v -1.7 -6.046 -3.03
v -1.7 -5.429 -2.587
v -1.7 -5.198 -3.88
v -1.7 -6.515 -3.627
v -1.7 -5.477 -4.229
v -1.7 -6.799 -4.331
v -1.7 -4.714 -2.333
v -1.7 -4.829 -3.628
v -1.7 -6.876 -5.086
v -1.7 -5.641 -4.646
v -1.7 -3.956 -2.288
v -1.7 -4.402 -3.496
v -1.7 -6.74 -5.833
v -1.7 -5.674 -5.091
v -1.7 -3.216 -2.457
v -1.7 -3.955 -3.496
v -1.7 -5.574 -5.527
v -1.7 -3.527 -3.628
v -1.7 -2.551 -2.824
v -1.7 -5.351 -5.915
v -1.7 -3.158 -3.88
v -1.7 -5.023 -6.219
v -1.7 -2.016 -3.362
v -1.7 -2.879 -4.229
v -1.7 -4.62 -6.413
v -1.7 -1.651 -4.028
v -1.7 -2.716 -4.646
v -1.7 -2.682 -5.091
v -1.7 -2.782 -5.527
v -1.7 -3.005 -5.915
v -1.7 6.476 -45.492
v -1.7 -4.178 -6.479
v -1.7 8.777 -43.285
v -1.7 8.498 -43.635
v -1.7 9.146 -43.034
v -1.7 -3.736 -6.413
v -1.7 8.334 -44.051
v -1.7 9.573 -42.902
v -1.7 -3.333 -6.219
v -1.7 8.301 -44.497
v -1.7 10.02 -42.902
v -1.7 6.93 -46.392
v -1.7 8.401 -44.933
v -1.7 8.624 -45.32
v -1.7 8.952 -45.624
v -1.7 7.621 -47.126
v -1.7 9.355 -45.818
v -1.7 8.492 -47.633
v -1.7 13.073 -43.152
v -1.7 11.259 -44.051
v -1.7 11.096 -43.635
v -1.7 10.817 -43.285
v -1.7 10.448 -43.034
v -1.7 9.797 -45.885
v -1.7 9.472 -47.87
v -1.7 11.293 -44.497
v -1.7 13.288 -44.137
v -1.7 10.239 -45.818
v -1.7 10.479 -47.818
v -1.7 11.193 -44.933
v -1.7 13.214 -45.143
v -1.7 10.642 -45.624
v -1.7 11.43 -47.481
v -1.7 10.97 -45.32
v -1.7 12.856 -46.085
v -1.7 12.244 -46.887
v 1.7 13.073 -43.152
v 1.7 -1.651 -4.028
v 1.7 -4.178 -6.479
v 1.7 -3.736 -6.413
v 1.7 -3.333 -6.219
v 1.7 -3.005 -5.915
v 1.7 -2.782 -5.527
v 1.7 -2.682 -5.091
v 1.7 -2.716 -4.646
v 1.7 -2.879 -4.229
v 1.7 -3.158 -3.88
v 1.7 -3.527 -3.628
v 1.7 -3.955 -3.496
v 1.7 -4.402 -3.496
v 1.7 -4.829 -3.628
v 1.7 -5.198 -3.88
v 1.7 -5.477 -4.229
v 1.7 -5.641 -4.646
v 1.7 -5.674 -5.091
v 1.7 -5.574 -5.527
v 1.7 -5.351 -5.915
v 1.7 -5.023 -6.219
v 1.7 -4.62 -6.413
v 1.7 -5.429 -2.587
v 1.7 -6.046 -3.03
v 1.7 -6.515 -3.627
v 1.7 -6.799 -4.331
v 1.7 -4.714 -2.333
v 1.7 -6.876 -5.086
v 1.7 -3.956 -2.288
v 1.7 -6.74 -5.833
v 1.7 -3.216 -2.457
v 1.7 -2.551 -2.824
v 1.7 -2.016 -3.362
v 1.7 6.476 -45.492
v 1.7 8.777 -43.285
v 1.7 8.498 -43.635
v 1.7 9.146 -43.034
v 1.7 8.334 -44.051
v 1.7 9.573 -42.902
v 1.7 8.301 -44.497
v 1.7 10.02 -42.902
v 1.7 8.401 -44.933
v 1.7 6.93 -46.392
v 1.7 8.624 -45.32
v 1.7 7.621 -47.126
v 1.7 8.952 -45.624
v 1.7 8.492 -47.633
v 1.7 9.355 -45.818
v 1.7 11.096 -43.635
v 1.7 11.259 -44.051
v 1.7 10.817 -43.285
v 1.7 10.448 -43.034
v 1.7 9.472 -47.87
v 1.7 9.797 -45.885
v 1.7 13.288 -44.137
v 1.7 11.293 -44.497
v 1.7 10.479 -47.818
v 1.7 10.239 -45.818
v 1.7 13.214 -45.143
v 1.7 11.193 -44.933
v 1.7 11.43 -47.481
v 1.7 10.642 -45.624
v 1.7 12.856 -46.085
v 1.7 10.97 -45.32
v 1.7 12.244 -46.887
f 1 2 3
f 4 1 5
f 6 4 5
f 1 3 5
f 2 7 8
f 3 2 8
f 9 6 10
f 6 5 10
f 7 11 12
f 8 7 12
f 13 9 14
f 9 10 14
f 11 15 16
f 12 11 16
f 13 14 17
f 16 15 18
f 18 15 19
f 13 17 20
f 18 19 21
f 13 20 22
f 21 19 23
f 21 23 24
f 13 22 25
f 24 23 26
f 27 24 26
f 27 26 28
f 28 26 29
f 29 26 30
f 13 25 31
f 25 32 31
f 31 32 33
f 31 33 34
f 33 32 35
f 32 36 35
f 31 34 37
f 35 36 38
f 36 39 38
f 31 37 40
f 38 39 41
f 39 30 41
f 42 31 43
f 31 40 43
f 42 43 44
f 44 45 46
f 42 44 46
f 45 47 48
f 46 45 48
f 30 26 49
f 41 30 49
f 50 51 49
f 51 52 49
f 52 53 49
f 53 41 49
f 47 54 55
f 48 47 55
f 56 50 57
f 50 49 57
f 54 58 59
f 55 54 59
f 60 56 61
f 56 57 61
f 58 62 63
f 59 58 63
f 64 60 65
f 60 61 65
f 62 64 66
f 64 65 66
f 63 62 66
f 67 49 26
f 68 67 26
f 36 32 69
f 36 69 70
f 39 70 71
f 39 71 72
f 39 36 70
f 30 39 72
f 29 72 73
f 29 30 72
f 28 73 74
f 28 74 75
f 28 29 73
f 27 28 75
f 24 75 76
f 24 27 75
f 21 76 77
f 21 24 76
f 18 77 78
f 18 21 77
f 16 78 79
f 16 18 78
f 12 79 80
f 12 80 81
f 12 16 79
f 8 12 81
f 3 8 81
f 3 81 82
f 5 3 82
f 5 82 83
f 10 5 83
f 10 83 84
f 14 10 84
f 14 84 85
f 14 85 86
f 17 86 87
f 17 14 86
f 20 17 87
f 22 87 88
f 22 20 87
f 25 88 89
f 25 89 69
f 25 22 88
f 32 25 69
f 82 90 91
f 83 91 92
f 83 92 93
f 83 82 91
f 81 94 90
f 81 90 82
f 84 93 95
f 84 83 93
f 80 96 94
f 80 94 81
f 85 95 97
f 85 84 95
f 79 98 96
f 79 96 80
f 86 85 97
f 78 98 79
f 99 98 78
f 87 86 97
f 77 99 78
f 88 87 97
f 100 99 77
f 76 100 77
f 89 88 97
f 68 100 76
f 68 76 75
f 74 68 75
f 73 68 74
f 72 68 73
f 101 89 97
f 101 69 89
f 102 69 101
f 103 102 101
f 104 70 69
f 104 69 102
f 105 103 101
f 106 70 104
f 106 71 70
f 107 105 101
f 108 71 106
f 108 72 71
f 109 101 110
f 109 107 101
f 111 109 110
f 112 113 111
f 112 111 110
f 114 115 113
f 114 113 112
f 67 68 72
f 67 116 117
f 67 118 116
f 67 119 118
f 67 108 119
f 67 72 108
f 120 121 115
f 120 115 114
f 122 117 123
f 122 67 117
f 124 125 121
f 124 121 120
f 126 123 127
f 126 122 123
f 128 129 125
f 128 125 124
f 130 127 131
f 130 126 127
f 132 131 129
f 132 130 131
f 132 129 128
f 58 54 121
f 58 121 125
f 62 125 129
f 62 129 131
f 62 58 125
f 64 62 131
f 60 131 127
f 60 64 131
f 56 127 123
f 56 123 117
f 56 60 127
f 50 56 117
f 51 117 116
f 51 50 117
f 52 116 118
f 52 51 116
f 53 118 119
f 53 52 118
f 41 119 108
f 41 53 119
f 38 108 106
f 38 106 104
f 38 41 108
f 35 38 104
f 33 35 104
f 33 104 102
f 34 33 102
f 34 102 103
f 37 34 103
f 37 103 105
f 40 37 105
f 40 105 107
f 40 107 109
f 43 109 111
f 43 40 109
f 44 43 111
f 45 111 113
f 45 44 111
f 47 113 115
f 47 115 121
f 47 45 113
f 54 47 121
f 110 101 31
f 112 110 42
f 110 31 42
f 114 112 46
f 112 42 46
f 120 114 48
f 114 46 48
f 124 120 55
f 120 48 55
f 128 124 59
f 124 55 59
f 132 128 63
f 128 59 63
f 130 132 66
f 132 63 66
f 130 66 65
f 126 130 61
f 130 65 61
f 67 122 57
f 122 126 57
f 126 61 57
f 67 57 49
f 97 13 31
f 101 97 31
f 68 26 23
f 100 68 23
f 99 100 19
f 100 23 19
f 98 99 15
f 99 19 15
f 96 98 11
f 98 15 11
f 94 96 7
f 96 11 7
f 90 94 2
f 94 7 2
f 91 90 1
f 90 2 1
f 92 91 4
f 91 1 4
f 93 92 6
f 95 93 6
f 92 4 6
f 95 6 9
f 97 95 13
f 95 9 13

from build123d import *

# Parameters (mm, degrees)
BOSS_EXTRUDE1_DEPTH      = 1.7
BOSS_EXTRUDE1_DEPTH_BACK = 1.7
SKETCH1_R                = 1.5


with BuildPart() as part:
    # Sketch1 → Boss-Extrude1 (new, two sides: drawn at the far end of the back side and taken through both)
    with BuildSketch(Plane(origin=(0, 0, 0), x_dir=(0, 0, -1), z_dir=(1, 0, 0)).offset(-BOSS_EXTRUDE1_DEPTH_BACK)):
        with BuildLine():
            Line((43.152237127, 13.072535054), (4.028300378, -1.651140858))
            ThreePointArc((4.028300378, -1.651140858), (2.434576682, -5.080582662), (5.832896346, -6.739633526))
            Line((5.832896346, -6.739633526), (45.491528196, 6.476340855))
            ThreePointArc((45.491528196, 6.476340855), (47.683700998, 10.966681751), (43.152237127, 13.072535054))
        make_face()
        with Locations((44.385, 9.796822048)):
            Circle(SKETCH1_R, mode=Mode.SUBTRACT)
        with Locations((4.97928888, -4.178119463)):
            Circle(SKETCH1_R, mode=Mode.SUBTRACT)
    extrude(amount=BOSS_EXTRUDE1_DEPTH + BOSS_EXTRUDE1_DEPTH_BACK)


solid = part.part
